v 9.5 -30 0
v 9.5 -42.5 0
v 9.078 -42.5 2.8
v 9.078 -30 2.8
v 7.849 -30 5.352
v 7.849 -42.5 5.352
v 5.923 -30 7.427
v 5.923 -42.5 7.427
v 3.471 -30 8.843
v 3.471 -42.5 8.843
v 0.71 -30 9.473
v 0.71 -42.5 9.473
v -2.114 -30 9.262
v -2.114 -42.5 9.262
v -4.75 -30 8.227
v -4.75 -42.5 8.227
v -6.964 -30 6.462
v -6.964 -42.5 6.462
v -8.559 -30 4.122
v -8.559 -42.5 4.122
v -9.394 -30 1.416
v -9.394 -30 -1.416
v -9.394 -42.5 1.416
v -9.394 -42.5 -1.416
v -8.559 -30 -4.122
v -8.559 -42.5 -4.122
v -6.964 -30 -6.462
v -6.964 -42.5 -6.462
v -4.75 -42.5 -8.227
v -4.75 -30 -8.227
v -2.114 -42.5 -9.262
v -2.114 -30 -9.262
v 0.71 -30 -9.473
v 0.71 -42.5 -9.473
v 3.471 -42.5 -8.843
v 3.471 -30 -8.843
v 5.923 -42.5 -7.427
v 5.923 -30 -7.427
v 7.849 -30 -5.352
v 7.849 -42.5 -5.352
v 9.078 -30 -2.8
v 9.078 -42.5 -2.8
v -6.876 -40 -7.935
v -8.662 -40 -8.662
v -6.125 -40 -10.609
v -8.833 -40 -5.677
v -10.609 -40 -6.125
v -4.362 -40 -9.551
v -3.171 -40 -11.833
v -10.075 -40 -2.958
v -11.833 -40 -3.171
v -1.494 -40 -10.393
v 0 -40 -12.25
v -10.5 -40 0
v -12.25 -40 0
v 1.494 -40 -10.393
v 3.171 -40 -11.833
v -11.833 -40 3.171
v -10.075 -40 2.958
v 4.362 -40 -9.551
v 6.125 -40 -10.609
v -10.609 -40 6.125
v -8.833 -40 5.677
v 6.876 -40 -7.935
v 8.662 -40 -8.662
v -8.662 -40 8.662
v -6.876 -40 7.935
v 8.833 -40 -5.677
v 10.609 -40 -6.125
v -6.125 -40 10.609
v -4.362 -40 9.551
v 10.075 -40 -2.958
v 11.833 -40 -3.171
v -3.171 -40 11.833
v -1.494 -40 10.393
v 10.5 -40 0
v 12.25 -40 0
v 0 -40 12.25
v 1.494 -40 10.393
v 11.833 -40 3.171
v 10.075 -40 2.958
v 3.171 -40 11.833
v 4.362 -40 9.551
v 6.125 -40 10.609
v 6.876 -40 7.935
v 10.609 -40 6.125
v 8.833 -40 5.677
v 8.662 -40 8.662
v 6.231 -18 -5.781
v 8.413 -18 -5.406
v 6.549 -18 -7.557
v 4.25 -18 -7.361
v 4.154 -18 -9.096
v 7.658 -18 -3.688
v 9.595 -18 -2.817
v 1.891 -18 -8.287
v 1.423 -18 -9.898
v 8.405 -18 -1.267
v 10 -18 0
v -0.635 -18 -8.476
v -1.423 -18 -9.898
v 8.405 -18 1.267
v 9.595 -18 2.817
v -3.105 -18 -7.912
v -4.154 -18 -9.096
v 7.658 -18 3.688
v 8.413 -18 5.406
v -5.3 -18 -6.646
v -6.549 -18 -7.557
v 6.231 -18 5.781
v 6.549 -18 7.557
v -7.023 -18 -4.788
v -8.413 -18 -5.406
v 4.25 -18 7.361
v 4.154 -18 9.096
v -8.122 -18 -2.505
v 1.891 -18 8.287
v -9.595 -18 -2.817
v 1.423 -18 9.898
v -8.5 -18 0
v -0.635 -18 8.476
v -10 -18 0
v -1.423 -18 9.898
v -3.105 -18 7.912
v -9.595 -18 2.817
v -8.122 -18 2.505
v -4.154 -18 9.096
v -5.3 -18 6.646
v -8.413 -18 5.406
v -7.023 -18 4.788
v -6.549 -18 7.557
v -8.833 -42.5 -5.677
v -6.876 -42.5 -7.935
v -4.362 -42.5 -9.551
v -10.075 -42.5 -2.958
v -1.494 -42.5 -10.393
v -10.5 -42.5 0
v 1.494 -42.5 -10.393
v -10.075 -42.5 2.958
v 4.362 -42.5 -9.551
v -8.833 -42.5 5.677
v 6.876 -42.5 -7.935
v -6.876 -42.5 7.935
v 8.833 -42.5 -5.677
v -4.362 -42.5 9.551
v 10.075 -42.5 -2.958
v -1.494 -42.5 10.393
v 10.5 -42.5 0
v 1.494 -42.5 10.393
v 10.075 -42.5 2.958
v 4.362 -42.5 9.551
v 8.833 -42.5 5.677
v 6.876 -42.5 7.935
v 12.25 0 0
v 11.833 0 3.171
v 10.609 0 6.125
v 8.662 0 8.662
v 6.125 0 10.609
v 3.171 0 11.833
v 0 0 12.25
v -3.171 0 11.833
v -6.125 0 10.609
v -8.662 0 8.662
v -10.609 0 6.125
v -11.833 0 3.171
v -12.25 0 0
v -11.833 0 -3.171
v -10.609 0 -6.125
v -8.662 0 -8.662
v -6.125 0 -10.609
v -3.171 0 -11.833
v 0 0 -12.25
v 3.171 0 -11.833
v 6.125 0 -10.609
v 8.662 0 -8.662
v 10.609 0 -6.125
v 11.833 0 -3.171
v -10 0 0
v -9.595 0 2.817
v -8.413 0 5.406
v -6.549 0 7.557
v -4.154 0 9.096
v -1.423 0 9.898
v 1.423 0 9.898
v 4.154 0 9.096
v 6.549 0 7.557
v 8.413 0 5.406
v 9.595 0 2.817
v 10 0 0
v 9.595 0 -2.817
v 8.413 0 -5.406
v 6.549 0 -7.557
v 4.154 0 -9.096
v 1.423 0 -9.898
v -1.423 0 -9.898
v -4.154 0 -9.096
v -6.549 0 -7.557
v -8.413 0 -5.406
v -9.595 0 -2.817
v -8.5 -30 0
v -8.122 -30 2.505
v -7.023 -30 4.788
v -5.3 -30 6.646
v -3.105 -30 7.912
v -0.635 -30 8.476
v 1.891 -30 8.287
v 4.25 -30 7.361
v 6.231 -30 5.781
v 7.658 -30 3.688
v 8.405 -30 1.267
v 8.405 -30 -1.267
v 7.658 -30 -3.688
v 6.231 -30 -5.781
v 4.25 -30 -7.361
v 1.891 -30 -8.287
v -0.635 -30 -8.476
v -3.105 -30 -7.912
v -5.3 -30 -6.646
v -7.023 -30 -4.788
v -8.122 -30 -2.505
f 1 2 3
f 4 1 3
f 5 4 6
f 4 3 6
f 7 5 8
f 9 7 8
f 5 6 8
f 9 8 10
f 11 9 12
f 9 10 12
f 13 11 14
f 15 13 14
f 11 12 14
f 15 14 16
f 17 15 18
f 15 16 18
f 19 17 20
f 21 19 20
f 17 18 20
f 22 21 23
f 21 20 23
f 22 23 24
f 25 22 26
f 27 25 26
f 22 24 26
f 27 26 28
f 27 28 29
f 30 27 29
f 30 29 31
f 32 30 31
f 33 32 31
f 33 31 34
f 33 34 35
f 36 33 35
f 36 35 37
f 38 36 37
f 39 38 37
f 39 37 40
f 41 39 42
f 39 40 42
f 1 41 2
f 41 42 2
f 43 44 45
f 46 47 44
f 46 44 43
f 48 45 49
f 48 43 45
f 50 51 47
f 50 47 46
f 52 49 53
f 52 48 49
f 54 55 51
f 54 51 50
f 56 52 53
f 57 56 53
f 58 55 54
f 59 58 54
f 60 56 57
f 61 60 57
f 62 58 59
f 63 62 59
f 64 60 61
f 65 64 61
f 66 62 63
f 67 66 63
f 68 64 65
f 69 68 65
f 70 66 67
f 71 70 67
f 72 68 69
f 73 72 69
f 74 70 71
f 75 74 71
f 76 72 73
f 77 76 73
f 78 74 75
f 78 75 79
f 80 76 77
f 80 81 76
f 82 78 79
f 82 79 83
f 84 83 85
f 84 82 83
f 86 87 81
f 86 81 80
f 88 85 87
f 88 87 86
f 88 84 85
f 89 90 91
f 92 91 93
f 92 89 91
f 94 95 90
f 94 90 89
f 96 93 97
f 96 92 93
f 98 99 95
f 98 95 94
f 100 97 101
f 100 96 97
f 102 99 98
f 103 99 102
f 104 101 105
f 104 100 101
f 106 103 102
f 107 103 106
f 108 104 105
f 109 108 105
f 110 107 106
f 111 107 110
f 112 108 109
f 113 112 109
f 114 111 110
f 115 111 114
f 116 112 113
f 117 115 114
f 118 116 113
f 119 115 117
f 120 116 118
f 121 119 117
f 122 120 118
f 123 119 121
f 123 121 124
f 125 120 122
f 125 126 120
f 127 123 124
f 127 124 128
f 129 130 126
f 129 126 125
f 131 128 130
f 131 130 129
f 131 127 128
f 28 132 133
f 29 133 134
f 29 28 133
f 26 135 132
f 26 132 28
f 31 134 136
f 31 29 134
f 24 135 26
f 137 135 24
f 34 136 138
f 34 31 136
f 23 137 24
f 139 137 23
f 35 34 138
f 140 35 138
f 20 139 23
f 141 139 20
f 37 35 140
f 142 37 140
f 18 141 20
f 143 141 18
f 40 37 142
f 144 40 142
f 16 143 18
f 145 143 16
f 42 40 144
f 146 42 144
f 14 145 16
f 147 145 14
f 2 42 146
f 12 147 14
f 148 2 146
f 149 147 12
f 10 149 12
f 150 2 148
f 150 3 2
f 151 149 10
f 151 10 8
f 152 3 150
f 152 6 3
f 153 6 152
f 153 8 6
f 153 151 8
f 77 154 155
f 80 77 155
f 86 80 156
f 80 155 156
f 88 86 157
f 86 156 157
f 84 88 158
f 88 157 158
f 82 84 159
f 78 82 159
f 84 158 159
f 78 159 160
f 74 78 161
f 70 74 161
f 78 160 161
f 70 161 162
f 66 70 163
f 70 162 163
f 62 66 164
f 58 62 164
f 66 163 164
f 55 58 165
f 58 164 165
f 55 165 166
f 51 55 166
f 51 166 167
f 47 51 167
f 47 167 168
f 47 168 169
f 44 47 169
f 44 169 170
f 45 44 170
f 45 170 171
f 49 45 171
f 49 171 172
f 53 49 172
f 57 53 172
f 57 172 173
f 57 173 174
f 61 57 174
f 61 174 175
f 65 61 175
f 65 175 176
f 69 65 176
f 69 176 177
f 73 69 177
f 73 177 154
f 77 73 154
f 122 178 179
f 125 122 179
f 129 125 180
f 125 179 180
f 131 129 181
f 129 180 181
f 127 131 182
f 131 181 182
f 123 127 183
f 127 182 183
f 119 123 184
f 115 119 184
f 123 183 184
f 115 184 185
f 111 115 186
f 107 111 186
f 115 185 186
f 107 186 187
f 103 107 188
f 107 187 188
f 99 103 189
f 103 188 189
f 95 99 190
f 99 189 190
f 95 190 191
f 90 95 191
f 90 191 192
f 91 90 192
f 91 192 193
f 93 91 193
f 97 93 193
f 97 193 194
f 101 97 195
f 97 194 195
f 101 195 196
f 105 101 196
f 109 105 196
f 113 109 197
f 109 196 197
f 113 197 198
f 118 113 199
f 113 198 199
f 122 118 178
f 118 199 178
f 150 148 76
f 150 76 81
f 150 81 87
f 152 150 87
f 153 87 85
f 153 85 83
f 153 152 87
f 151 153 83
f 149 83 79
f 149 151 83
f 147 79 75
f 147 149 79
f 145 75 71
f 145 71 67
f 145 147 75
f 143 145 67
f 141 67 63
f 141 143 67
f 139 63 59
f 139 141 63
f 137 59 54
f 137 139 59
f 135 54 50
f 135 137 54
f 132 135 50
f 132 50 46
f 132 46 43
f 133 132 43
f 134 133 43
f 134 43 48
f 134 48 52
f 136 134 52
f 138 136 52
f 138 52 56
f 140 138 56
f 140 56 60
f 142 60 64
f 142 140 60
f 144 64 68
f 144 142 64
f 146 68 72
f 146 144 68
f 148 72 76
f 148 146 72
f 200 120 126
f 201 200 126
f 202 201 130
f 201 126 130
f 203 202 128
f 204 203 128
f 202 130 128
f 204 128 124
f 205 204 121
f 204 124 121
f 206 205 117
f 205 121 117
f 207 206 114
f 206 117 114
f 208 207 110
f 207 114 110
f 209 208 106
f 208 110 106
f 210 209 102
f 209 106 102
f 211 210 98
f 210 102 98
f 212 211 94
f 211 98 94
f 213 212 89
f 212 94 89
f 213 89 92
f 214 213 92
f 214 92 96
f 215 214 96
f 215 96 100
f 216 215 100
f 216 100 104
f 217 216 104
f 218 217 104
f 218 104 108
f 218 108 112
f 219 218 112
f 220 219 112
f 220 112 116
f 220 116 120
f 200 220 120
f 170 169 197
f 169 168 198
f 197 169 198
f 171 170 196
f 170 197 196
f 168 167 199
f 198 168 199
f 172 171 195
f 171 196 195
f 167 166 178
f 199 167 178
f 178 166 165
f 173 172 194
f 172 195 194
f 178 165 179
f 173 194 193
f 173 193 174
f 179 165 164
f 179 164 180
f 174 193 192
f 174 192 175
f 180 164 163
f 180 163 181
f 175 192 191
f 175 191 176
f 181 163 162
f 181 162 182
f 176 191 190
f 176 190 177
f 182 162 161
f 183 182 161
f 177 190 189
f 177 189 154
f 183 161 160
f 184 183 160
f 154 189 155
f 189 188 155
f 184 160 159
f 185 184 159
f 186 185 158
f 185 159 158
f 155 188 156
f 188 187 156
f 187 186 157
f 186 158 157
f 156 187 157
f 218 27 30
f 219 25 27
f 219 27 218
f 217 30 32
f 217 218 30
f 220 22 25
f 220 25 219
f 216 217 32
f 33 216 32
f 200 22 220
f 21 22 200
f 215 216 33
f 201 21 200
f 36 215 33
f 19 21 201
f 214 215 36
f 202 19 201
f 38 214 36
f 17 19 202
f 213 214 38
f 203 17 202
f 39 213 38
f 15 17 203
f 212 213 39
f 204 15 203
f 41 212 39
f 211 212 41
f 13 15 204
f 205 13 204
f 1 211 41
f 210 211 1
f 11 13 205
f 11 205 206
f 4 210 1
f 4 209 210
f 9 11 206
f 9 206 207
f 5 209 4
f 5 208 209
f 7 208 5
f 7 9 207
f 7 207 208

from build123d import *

# Parameters (mm, degrees)
F0_R     = 12.25
F1_DEPTH = 42.5
F2_R     = 12.25
F2_R_2   = 10.5
F3_DEPTH = 2.5
F4_R     = 9.5
F5_DEPTH = 12.5
F6_R     = 10
F7_DEPTH = 18
F8_R     = 8.5
F9_DEPTH = 25


with BuildPart() as f1:
    # F0 (on Front) → F1 (new body)
    with BuildSketch(Plane.XZ):
        Circle(F0_R)
    extrude(amount=F1_DEPTH)

    # F2 (on face) → F3 (cut)
    with BuildSketch(Plane.XZ.offset(42.5)):
        Circle(F2_R)
        Circle(F2_R_2, mode=Mode.SUBTRACT)
    extrude(amount=-F3_DEPTH, mode=Mode.SUBTRACT)

    # F4 (on face) → F5 (cut)
    with BuildSketch(Plane.XZ.offset(42.5)):
        Circle(F4_R)
    extrude(amount=-F5_DEPTH, mode=Mode.SUBTRACT)

    # F6 (on face) → F7 (cut)
    with BuildSketch(Plane(origin=(0, 0, 0), x_dir=(-1, 0, 0), z_dir=(0, 1, 0))):
        Circle(F6_R)
    extrude(amount=-F7_DEPTH, mode=Mode.SUBTRACT)

    # F8 (on face) → F9 (cut)
    with BuildSketch(Plane(origin=(0, -18, 0), x_dir=(-1, 0, 0), z_dir=(0, 1, 0))):
        Circle(F8_R)
    extrude(amount=-F9_DEPTH, mode=Mode.SUBTRACT)


solid = f1.part
